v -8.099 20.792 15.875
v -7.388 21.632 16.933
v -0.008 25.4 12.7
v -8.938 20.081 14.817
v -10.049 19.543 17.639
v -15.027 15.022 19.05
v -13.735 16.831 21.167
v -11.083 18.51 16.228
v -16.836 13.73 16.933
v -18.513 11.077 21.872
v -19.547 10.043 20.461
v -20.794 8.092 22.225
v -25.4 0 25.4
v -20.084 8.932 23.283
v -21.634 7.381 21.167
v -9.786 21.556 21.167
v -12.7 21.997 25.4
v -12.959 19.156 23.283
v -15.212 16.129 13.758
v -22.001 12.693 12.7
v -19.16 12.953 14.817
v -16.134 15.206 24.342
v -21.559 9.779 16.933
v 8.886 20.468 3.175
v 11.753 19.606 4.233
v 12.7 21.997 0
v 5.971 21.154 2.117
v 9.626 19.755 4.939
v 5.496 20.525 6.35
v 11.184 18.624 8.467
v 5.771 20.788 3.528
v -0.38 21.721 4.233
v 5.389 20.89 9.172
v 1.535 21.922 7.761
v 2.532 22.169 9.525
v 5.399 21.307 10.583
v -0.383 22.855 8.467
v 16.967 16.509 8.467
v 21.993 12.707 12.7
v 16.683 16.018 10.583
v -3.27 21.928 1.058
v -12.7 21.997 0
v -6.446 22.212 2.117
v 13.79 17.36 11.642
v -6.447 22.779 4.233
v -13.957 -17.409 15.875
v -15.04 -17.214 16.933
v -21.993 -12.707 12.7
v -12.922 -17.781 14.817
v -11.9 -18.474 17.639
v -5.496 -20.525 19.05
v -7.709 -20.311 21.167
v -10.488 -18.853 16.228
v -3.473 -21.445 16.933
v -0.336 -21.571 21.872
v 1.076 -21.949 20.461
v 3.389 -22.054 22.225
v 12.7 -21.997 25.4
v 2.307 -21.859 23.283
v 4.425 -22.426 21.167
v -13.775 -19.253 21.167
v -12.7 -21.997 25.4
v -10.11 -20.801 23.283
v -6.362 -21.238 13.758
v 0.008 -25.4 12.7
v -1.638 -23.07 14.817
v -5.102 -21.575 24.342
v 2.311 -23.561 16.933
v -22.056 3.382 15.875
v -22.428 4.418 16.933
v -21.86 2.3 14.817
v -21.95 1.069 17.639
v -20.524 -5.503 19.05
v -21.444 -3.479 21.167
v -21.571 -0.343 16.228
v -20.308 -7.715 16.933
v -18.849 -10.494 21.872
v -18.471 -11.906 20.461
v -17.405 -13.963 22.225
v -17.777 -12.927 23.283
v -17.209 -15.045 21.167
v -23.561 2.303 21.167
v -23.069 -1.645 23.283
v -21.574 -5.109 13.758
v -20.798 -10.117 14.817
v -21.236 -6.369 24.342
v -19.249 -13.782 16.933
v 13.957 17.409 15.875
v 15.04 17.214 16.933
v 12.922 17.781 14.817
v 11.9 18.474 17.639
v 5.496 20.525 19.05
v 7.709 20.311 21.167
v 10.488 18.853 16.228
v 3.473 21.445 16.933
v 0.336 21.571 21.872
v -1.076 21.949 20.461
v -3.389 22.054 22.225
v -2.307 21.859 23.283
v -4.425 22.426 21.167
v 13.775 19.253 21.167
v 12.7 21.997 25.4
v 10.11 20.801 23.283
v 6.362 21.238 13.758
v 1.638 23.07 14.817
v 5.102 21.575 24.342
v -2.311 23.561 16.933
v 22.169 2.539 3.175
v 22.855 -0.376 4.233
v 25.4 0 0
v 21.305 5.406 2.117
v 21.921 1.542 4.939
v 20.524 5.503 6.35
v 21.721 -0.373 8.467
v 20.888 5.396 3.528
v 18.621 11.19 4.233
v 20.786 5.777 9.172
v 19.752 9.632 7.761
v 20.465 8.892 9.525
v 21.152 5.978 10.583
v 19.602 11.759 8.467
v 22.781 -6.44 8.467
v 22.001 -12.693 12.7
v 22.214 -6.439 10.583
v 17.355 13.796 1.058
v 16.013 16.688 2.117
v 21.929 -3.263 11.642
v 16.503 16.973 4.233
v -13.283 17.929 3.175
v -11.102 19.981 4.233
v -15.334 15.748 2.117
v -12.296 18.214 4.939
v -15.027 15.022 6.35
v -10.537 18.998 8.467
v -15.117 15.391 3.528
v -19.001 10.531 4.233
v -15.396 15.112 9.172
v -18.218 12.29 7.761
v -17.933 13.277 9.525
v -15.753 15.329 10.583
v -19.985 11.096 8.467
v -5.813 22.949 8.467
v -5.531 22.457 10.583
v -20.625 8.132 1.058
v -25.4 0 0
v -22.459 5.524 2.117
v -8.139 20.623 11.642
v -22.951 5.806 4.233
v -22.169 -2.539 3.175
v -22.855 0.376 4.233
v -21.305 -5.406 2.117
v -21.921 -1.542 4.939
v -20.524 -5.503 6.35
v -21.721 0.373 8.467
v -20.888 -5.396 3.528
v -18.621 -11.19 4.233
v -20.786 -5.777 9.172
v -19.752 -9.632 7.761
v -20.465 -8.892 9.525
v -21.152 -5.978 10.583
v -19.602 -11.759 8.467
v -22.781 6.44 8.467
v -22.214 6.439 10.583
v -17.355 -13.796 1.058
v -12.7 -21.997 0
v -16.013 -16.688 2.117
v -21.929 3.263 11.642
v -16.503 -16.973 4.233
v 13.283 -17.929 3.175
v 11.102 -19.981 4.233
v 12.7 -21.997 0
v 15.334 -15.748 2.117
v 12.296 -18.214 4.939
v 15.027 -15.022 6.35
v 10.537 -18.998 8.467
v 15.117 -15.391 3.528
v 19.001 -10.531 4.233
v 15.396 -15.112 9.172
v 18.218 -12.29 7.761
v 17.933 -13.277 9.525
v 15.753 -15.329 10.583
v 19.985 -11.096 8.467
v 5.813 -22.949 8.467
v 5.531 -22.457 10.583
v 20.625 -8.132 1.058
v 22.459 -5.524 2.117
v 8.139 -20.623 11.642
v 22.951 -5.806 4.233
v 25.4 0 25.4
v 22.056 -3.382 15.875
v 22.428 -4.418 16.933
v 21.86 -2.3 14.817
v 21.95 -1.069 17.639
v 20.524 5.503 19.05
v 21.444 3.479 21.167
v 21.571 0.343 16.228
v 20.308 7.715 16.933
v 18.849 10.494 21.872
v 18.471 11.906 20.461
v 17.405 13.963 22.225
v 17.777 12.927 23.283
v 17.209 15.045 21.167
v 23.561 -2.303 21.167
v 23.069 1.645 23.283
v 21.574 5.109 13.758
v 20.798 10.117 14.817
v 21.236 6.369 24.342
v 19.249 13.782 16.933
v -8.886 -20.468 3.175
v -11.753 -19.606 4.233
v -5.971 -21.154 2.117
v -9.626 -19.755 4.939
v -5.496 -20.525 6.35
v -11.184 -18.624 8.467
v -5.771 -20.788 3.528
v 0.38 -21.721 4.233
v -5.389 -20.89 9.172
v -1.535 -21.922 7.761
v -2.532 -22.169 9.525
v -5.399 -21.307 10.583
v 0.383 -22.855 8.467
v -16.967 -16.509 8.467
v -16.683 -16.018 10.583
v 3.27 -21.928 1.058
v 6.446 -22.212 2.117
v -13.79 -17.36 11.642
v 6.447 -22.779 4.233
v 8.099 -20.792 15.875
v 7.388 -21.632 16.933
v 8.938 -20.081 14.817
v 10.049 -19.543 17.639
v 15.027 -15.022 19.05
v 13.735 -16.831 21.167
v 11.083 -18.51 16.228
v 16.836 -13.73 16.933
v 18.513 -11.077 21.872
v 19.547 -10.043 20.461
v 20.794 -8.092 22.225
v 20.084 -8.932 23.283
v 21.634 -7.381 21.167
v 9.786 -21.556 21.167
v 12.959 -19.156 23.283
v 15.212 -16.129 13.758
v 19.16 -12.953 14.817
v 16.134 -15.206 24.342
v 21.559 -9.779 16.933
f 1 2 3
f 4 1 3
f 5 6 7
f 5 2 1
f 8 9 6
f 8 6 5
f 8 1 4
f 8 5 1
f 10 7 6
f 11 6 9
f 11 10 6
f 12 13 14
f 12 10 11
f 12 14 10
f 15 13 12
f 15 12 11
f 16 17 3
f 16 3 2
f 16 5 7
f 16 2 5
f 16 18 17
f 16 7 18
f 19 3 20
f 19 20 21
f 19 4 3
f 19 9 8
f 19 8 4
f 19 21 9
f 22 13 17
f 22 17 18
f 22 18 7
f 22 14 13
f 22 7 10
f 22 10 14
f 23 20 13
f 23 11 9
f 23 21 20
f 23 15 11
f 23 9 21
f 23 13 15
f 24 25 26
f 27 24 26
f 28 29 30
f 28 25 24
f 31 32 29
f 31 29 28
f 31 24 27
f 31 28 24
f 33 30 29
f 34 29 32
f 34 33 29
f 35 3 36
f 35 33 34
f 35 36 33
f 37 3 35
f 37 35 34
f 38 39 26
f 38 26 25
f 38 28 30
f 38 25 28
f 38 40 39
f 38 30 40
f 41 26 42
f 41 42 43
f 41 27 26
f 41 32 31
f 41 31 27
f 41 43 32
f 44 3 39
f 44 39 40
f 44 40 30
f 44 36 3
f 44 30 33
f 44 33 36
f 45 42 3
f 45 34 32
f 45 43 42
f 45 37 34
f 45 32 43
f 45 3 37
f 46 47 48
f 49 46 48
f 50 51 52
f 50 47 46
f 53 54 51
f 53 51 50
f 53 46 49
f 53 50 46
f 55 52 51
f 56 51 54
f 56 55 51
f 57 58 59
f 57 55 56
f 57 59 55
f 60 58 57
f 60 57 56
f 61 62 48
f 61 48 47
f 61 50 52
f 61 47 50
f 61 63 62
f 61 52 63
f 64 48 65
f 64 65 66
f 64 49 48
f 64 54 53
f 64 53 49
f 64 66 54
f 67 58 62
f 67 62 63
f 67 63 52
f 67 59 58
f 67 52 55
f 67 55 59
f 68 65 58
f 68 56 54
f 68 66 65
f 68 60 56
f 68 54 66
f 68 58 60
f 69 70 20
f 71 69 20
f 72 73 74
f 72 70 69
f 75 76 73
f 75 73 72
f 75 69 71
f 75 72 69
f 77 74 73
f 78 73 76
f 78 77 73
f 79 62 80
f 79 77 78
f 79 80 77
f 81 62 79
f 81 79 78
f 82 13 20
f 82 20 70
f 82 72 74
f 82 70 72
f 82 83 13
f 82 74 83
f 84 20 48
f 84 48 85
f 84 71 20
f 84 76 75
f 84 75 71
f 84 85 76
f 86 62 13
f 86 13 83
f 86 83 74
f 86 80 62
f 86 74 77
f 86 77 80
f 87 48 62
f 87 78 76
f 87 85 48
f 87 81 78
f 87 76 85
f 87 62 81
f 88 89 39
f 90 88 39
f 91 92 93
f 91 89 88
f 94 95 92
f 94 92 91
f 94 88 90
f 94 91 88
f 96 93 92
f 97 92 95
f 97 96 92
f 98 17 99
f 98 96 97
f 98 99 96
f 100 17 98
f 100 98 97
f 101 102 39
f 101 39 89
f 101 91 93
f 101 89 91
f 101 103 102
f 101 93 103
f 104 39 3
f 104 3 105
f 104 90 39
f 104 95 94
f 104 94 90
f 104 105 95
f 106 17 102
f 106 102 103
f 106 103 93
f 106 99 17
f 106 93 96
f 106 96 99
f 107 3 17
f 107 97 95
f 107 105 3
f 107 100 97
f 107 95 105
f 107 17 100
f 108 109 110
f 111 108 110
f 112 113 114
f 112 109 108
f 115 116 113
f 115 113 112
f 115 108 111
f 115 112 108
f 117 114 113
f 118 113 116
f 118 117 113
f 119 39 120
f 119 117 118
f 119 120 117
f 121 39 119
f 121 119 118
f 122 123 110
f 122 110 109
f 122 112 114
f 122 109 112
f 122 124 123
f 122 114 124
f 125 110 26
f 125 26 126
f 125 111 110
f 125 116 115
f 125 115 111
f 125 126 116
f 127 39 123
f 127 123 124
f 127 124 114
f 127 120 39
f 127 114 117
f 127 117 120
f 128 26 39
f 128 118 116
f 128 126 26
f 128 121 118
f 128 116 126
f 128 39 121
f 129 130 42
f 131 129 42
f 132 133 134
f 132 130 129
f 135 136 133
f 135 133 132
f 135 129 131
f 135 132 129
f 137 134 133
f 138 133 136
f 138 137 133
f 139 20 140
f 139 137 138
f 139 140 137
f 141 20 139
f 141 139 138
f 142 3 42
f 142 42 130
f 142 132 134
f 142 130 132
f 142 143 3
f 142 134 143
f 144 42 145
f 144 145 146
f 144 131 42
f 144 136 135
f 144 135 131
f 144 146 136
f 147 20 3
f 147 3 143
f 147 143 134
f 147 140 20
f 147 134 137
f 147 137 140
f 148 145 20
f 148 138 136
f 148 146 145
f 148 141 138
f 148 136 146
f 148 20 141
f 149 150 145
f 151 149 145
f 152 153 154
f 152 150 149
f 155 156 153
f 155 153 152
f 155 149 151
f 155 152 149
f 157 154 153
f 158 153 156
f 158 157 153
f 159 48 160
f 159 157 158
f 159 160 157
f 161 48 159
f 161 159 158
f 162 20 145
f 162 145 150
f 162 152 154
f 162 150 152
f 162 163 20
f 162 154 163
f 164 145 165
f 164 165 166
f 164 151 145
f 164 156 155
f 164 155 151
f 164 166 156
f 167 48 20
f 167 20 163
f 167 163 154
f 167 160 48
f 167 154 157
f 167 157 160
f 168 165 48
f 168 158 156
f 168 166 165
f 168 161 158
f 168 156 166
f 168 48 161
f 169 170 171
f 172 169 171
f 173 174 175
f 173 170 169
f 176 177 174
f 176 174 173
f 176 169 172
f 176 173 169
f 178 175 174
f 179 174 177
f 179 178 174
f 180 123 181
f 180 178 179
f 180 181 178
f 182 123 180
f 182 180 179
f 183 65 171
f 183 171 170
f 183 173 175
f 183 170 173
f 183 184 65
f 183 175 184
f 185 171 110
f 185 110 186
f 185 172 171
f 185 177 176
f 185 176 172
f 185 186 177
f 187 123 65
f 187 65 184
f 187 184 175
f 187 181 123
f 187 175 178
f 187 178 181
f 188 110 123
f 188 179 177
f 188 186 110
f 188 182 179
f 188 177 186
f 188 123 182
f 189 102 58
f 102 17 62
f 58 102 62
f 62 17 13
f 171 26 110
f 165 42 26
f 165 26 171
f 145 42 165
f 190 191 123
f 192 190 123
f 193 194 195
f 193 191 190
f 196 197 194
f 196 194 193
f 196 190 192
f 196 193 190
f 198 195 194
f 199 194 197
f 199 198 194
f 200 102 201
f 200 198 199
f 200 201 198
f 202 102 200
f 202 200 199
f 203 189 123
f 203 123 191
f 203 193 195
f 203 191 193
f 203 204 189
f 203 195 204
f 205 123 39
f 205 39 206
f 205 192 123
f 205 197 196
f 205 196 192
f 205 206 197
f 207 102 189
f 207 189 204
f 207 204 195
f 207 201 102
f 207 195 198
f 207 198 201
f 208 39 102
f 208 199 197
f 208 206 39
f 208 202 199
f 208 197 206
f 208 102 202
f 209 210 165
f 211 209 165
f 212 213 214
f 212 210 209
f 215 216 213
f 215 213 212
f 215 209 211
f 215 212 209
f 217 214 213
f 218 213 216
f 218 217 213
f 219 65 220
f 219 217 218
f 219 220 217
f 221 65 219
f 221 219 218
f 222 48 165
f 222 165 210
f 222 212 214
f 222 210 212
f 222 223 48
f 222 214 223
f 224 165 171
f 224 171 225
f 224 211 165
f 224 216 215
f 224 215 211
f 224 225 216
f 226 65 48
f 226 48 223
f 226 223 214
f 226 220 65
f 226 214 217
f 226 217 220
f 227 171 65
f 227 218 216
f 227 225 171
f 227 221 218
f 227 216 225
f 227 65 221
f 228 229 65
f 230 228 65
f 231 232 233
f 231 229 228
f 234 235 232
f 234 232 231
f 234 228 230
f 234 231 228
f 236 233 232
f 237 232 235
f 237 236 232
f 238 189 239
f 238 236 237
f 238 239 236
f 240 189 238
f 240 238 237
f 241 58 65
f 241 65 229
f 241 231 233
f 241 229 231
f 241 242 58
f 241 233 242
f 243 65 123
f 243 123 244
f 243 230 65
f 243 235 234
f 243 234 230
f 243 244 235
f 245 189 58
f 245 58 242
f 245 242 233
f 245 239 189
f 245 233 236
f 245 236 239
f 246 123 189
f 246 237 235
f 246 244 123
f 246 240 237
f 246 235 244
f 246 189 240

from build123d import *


with BuildPart() as f3:
    # F0 (on Top) → F3 section 0
    with BuildSketch(Plane.XY):
        Polygon((12.7, 21.9970452561), (-12.7, 21.9970452561), (-25.4, 0), (-12.7, -21.9970452561), (12.7, -21.9970452561), (25.4, 0), align=None)
    # F2 (on offset) → F3 section 1
    with BuildSketch(Plane.XY.offset(12.7)):
        Polygon((-0.0081428164, 25.3999986948), (-22.001115534, 12.6929474615), (-21.9929727176, -12.7070512333), (0.0081428164, -25.3999986948), (22.001115534, -12.6929474615), (21.9929727176, 12.7070512333), align=None)
    loft()

    # F3_face (on face) → F6 section 0
    with BuildSketch(Plane.XY.offset(12.7)):
        Polygon((21.9929727176, 12.7070512333), (-0.0081428164, 25.3999986948), (-22.001115534, 12.6929474615), (-21.9929727176, -12.7070512333), (0.0081428164, -25.3999986948), (22.001115534, -12.6929474615), align=None)
    # F5 (on offset) → F6 section 1
    with BuildSketch(Plane.XY.offset(25.4)):
        Polygon((12.7, 21.9970452561), (-12.7, 21.9970452561), (-25.4, 0), (-12.7, -21.9970452561), (12.7, -21.9970452561), (25.4, 0), align=None)
    loft()


solid = f3.part
